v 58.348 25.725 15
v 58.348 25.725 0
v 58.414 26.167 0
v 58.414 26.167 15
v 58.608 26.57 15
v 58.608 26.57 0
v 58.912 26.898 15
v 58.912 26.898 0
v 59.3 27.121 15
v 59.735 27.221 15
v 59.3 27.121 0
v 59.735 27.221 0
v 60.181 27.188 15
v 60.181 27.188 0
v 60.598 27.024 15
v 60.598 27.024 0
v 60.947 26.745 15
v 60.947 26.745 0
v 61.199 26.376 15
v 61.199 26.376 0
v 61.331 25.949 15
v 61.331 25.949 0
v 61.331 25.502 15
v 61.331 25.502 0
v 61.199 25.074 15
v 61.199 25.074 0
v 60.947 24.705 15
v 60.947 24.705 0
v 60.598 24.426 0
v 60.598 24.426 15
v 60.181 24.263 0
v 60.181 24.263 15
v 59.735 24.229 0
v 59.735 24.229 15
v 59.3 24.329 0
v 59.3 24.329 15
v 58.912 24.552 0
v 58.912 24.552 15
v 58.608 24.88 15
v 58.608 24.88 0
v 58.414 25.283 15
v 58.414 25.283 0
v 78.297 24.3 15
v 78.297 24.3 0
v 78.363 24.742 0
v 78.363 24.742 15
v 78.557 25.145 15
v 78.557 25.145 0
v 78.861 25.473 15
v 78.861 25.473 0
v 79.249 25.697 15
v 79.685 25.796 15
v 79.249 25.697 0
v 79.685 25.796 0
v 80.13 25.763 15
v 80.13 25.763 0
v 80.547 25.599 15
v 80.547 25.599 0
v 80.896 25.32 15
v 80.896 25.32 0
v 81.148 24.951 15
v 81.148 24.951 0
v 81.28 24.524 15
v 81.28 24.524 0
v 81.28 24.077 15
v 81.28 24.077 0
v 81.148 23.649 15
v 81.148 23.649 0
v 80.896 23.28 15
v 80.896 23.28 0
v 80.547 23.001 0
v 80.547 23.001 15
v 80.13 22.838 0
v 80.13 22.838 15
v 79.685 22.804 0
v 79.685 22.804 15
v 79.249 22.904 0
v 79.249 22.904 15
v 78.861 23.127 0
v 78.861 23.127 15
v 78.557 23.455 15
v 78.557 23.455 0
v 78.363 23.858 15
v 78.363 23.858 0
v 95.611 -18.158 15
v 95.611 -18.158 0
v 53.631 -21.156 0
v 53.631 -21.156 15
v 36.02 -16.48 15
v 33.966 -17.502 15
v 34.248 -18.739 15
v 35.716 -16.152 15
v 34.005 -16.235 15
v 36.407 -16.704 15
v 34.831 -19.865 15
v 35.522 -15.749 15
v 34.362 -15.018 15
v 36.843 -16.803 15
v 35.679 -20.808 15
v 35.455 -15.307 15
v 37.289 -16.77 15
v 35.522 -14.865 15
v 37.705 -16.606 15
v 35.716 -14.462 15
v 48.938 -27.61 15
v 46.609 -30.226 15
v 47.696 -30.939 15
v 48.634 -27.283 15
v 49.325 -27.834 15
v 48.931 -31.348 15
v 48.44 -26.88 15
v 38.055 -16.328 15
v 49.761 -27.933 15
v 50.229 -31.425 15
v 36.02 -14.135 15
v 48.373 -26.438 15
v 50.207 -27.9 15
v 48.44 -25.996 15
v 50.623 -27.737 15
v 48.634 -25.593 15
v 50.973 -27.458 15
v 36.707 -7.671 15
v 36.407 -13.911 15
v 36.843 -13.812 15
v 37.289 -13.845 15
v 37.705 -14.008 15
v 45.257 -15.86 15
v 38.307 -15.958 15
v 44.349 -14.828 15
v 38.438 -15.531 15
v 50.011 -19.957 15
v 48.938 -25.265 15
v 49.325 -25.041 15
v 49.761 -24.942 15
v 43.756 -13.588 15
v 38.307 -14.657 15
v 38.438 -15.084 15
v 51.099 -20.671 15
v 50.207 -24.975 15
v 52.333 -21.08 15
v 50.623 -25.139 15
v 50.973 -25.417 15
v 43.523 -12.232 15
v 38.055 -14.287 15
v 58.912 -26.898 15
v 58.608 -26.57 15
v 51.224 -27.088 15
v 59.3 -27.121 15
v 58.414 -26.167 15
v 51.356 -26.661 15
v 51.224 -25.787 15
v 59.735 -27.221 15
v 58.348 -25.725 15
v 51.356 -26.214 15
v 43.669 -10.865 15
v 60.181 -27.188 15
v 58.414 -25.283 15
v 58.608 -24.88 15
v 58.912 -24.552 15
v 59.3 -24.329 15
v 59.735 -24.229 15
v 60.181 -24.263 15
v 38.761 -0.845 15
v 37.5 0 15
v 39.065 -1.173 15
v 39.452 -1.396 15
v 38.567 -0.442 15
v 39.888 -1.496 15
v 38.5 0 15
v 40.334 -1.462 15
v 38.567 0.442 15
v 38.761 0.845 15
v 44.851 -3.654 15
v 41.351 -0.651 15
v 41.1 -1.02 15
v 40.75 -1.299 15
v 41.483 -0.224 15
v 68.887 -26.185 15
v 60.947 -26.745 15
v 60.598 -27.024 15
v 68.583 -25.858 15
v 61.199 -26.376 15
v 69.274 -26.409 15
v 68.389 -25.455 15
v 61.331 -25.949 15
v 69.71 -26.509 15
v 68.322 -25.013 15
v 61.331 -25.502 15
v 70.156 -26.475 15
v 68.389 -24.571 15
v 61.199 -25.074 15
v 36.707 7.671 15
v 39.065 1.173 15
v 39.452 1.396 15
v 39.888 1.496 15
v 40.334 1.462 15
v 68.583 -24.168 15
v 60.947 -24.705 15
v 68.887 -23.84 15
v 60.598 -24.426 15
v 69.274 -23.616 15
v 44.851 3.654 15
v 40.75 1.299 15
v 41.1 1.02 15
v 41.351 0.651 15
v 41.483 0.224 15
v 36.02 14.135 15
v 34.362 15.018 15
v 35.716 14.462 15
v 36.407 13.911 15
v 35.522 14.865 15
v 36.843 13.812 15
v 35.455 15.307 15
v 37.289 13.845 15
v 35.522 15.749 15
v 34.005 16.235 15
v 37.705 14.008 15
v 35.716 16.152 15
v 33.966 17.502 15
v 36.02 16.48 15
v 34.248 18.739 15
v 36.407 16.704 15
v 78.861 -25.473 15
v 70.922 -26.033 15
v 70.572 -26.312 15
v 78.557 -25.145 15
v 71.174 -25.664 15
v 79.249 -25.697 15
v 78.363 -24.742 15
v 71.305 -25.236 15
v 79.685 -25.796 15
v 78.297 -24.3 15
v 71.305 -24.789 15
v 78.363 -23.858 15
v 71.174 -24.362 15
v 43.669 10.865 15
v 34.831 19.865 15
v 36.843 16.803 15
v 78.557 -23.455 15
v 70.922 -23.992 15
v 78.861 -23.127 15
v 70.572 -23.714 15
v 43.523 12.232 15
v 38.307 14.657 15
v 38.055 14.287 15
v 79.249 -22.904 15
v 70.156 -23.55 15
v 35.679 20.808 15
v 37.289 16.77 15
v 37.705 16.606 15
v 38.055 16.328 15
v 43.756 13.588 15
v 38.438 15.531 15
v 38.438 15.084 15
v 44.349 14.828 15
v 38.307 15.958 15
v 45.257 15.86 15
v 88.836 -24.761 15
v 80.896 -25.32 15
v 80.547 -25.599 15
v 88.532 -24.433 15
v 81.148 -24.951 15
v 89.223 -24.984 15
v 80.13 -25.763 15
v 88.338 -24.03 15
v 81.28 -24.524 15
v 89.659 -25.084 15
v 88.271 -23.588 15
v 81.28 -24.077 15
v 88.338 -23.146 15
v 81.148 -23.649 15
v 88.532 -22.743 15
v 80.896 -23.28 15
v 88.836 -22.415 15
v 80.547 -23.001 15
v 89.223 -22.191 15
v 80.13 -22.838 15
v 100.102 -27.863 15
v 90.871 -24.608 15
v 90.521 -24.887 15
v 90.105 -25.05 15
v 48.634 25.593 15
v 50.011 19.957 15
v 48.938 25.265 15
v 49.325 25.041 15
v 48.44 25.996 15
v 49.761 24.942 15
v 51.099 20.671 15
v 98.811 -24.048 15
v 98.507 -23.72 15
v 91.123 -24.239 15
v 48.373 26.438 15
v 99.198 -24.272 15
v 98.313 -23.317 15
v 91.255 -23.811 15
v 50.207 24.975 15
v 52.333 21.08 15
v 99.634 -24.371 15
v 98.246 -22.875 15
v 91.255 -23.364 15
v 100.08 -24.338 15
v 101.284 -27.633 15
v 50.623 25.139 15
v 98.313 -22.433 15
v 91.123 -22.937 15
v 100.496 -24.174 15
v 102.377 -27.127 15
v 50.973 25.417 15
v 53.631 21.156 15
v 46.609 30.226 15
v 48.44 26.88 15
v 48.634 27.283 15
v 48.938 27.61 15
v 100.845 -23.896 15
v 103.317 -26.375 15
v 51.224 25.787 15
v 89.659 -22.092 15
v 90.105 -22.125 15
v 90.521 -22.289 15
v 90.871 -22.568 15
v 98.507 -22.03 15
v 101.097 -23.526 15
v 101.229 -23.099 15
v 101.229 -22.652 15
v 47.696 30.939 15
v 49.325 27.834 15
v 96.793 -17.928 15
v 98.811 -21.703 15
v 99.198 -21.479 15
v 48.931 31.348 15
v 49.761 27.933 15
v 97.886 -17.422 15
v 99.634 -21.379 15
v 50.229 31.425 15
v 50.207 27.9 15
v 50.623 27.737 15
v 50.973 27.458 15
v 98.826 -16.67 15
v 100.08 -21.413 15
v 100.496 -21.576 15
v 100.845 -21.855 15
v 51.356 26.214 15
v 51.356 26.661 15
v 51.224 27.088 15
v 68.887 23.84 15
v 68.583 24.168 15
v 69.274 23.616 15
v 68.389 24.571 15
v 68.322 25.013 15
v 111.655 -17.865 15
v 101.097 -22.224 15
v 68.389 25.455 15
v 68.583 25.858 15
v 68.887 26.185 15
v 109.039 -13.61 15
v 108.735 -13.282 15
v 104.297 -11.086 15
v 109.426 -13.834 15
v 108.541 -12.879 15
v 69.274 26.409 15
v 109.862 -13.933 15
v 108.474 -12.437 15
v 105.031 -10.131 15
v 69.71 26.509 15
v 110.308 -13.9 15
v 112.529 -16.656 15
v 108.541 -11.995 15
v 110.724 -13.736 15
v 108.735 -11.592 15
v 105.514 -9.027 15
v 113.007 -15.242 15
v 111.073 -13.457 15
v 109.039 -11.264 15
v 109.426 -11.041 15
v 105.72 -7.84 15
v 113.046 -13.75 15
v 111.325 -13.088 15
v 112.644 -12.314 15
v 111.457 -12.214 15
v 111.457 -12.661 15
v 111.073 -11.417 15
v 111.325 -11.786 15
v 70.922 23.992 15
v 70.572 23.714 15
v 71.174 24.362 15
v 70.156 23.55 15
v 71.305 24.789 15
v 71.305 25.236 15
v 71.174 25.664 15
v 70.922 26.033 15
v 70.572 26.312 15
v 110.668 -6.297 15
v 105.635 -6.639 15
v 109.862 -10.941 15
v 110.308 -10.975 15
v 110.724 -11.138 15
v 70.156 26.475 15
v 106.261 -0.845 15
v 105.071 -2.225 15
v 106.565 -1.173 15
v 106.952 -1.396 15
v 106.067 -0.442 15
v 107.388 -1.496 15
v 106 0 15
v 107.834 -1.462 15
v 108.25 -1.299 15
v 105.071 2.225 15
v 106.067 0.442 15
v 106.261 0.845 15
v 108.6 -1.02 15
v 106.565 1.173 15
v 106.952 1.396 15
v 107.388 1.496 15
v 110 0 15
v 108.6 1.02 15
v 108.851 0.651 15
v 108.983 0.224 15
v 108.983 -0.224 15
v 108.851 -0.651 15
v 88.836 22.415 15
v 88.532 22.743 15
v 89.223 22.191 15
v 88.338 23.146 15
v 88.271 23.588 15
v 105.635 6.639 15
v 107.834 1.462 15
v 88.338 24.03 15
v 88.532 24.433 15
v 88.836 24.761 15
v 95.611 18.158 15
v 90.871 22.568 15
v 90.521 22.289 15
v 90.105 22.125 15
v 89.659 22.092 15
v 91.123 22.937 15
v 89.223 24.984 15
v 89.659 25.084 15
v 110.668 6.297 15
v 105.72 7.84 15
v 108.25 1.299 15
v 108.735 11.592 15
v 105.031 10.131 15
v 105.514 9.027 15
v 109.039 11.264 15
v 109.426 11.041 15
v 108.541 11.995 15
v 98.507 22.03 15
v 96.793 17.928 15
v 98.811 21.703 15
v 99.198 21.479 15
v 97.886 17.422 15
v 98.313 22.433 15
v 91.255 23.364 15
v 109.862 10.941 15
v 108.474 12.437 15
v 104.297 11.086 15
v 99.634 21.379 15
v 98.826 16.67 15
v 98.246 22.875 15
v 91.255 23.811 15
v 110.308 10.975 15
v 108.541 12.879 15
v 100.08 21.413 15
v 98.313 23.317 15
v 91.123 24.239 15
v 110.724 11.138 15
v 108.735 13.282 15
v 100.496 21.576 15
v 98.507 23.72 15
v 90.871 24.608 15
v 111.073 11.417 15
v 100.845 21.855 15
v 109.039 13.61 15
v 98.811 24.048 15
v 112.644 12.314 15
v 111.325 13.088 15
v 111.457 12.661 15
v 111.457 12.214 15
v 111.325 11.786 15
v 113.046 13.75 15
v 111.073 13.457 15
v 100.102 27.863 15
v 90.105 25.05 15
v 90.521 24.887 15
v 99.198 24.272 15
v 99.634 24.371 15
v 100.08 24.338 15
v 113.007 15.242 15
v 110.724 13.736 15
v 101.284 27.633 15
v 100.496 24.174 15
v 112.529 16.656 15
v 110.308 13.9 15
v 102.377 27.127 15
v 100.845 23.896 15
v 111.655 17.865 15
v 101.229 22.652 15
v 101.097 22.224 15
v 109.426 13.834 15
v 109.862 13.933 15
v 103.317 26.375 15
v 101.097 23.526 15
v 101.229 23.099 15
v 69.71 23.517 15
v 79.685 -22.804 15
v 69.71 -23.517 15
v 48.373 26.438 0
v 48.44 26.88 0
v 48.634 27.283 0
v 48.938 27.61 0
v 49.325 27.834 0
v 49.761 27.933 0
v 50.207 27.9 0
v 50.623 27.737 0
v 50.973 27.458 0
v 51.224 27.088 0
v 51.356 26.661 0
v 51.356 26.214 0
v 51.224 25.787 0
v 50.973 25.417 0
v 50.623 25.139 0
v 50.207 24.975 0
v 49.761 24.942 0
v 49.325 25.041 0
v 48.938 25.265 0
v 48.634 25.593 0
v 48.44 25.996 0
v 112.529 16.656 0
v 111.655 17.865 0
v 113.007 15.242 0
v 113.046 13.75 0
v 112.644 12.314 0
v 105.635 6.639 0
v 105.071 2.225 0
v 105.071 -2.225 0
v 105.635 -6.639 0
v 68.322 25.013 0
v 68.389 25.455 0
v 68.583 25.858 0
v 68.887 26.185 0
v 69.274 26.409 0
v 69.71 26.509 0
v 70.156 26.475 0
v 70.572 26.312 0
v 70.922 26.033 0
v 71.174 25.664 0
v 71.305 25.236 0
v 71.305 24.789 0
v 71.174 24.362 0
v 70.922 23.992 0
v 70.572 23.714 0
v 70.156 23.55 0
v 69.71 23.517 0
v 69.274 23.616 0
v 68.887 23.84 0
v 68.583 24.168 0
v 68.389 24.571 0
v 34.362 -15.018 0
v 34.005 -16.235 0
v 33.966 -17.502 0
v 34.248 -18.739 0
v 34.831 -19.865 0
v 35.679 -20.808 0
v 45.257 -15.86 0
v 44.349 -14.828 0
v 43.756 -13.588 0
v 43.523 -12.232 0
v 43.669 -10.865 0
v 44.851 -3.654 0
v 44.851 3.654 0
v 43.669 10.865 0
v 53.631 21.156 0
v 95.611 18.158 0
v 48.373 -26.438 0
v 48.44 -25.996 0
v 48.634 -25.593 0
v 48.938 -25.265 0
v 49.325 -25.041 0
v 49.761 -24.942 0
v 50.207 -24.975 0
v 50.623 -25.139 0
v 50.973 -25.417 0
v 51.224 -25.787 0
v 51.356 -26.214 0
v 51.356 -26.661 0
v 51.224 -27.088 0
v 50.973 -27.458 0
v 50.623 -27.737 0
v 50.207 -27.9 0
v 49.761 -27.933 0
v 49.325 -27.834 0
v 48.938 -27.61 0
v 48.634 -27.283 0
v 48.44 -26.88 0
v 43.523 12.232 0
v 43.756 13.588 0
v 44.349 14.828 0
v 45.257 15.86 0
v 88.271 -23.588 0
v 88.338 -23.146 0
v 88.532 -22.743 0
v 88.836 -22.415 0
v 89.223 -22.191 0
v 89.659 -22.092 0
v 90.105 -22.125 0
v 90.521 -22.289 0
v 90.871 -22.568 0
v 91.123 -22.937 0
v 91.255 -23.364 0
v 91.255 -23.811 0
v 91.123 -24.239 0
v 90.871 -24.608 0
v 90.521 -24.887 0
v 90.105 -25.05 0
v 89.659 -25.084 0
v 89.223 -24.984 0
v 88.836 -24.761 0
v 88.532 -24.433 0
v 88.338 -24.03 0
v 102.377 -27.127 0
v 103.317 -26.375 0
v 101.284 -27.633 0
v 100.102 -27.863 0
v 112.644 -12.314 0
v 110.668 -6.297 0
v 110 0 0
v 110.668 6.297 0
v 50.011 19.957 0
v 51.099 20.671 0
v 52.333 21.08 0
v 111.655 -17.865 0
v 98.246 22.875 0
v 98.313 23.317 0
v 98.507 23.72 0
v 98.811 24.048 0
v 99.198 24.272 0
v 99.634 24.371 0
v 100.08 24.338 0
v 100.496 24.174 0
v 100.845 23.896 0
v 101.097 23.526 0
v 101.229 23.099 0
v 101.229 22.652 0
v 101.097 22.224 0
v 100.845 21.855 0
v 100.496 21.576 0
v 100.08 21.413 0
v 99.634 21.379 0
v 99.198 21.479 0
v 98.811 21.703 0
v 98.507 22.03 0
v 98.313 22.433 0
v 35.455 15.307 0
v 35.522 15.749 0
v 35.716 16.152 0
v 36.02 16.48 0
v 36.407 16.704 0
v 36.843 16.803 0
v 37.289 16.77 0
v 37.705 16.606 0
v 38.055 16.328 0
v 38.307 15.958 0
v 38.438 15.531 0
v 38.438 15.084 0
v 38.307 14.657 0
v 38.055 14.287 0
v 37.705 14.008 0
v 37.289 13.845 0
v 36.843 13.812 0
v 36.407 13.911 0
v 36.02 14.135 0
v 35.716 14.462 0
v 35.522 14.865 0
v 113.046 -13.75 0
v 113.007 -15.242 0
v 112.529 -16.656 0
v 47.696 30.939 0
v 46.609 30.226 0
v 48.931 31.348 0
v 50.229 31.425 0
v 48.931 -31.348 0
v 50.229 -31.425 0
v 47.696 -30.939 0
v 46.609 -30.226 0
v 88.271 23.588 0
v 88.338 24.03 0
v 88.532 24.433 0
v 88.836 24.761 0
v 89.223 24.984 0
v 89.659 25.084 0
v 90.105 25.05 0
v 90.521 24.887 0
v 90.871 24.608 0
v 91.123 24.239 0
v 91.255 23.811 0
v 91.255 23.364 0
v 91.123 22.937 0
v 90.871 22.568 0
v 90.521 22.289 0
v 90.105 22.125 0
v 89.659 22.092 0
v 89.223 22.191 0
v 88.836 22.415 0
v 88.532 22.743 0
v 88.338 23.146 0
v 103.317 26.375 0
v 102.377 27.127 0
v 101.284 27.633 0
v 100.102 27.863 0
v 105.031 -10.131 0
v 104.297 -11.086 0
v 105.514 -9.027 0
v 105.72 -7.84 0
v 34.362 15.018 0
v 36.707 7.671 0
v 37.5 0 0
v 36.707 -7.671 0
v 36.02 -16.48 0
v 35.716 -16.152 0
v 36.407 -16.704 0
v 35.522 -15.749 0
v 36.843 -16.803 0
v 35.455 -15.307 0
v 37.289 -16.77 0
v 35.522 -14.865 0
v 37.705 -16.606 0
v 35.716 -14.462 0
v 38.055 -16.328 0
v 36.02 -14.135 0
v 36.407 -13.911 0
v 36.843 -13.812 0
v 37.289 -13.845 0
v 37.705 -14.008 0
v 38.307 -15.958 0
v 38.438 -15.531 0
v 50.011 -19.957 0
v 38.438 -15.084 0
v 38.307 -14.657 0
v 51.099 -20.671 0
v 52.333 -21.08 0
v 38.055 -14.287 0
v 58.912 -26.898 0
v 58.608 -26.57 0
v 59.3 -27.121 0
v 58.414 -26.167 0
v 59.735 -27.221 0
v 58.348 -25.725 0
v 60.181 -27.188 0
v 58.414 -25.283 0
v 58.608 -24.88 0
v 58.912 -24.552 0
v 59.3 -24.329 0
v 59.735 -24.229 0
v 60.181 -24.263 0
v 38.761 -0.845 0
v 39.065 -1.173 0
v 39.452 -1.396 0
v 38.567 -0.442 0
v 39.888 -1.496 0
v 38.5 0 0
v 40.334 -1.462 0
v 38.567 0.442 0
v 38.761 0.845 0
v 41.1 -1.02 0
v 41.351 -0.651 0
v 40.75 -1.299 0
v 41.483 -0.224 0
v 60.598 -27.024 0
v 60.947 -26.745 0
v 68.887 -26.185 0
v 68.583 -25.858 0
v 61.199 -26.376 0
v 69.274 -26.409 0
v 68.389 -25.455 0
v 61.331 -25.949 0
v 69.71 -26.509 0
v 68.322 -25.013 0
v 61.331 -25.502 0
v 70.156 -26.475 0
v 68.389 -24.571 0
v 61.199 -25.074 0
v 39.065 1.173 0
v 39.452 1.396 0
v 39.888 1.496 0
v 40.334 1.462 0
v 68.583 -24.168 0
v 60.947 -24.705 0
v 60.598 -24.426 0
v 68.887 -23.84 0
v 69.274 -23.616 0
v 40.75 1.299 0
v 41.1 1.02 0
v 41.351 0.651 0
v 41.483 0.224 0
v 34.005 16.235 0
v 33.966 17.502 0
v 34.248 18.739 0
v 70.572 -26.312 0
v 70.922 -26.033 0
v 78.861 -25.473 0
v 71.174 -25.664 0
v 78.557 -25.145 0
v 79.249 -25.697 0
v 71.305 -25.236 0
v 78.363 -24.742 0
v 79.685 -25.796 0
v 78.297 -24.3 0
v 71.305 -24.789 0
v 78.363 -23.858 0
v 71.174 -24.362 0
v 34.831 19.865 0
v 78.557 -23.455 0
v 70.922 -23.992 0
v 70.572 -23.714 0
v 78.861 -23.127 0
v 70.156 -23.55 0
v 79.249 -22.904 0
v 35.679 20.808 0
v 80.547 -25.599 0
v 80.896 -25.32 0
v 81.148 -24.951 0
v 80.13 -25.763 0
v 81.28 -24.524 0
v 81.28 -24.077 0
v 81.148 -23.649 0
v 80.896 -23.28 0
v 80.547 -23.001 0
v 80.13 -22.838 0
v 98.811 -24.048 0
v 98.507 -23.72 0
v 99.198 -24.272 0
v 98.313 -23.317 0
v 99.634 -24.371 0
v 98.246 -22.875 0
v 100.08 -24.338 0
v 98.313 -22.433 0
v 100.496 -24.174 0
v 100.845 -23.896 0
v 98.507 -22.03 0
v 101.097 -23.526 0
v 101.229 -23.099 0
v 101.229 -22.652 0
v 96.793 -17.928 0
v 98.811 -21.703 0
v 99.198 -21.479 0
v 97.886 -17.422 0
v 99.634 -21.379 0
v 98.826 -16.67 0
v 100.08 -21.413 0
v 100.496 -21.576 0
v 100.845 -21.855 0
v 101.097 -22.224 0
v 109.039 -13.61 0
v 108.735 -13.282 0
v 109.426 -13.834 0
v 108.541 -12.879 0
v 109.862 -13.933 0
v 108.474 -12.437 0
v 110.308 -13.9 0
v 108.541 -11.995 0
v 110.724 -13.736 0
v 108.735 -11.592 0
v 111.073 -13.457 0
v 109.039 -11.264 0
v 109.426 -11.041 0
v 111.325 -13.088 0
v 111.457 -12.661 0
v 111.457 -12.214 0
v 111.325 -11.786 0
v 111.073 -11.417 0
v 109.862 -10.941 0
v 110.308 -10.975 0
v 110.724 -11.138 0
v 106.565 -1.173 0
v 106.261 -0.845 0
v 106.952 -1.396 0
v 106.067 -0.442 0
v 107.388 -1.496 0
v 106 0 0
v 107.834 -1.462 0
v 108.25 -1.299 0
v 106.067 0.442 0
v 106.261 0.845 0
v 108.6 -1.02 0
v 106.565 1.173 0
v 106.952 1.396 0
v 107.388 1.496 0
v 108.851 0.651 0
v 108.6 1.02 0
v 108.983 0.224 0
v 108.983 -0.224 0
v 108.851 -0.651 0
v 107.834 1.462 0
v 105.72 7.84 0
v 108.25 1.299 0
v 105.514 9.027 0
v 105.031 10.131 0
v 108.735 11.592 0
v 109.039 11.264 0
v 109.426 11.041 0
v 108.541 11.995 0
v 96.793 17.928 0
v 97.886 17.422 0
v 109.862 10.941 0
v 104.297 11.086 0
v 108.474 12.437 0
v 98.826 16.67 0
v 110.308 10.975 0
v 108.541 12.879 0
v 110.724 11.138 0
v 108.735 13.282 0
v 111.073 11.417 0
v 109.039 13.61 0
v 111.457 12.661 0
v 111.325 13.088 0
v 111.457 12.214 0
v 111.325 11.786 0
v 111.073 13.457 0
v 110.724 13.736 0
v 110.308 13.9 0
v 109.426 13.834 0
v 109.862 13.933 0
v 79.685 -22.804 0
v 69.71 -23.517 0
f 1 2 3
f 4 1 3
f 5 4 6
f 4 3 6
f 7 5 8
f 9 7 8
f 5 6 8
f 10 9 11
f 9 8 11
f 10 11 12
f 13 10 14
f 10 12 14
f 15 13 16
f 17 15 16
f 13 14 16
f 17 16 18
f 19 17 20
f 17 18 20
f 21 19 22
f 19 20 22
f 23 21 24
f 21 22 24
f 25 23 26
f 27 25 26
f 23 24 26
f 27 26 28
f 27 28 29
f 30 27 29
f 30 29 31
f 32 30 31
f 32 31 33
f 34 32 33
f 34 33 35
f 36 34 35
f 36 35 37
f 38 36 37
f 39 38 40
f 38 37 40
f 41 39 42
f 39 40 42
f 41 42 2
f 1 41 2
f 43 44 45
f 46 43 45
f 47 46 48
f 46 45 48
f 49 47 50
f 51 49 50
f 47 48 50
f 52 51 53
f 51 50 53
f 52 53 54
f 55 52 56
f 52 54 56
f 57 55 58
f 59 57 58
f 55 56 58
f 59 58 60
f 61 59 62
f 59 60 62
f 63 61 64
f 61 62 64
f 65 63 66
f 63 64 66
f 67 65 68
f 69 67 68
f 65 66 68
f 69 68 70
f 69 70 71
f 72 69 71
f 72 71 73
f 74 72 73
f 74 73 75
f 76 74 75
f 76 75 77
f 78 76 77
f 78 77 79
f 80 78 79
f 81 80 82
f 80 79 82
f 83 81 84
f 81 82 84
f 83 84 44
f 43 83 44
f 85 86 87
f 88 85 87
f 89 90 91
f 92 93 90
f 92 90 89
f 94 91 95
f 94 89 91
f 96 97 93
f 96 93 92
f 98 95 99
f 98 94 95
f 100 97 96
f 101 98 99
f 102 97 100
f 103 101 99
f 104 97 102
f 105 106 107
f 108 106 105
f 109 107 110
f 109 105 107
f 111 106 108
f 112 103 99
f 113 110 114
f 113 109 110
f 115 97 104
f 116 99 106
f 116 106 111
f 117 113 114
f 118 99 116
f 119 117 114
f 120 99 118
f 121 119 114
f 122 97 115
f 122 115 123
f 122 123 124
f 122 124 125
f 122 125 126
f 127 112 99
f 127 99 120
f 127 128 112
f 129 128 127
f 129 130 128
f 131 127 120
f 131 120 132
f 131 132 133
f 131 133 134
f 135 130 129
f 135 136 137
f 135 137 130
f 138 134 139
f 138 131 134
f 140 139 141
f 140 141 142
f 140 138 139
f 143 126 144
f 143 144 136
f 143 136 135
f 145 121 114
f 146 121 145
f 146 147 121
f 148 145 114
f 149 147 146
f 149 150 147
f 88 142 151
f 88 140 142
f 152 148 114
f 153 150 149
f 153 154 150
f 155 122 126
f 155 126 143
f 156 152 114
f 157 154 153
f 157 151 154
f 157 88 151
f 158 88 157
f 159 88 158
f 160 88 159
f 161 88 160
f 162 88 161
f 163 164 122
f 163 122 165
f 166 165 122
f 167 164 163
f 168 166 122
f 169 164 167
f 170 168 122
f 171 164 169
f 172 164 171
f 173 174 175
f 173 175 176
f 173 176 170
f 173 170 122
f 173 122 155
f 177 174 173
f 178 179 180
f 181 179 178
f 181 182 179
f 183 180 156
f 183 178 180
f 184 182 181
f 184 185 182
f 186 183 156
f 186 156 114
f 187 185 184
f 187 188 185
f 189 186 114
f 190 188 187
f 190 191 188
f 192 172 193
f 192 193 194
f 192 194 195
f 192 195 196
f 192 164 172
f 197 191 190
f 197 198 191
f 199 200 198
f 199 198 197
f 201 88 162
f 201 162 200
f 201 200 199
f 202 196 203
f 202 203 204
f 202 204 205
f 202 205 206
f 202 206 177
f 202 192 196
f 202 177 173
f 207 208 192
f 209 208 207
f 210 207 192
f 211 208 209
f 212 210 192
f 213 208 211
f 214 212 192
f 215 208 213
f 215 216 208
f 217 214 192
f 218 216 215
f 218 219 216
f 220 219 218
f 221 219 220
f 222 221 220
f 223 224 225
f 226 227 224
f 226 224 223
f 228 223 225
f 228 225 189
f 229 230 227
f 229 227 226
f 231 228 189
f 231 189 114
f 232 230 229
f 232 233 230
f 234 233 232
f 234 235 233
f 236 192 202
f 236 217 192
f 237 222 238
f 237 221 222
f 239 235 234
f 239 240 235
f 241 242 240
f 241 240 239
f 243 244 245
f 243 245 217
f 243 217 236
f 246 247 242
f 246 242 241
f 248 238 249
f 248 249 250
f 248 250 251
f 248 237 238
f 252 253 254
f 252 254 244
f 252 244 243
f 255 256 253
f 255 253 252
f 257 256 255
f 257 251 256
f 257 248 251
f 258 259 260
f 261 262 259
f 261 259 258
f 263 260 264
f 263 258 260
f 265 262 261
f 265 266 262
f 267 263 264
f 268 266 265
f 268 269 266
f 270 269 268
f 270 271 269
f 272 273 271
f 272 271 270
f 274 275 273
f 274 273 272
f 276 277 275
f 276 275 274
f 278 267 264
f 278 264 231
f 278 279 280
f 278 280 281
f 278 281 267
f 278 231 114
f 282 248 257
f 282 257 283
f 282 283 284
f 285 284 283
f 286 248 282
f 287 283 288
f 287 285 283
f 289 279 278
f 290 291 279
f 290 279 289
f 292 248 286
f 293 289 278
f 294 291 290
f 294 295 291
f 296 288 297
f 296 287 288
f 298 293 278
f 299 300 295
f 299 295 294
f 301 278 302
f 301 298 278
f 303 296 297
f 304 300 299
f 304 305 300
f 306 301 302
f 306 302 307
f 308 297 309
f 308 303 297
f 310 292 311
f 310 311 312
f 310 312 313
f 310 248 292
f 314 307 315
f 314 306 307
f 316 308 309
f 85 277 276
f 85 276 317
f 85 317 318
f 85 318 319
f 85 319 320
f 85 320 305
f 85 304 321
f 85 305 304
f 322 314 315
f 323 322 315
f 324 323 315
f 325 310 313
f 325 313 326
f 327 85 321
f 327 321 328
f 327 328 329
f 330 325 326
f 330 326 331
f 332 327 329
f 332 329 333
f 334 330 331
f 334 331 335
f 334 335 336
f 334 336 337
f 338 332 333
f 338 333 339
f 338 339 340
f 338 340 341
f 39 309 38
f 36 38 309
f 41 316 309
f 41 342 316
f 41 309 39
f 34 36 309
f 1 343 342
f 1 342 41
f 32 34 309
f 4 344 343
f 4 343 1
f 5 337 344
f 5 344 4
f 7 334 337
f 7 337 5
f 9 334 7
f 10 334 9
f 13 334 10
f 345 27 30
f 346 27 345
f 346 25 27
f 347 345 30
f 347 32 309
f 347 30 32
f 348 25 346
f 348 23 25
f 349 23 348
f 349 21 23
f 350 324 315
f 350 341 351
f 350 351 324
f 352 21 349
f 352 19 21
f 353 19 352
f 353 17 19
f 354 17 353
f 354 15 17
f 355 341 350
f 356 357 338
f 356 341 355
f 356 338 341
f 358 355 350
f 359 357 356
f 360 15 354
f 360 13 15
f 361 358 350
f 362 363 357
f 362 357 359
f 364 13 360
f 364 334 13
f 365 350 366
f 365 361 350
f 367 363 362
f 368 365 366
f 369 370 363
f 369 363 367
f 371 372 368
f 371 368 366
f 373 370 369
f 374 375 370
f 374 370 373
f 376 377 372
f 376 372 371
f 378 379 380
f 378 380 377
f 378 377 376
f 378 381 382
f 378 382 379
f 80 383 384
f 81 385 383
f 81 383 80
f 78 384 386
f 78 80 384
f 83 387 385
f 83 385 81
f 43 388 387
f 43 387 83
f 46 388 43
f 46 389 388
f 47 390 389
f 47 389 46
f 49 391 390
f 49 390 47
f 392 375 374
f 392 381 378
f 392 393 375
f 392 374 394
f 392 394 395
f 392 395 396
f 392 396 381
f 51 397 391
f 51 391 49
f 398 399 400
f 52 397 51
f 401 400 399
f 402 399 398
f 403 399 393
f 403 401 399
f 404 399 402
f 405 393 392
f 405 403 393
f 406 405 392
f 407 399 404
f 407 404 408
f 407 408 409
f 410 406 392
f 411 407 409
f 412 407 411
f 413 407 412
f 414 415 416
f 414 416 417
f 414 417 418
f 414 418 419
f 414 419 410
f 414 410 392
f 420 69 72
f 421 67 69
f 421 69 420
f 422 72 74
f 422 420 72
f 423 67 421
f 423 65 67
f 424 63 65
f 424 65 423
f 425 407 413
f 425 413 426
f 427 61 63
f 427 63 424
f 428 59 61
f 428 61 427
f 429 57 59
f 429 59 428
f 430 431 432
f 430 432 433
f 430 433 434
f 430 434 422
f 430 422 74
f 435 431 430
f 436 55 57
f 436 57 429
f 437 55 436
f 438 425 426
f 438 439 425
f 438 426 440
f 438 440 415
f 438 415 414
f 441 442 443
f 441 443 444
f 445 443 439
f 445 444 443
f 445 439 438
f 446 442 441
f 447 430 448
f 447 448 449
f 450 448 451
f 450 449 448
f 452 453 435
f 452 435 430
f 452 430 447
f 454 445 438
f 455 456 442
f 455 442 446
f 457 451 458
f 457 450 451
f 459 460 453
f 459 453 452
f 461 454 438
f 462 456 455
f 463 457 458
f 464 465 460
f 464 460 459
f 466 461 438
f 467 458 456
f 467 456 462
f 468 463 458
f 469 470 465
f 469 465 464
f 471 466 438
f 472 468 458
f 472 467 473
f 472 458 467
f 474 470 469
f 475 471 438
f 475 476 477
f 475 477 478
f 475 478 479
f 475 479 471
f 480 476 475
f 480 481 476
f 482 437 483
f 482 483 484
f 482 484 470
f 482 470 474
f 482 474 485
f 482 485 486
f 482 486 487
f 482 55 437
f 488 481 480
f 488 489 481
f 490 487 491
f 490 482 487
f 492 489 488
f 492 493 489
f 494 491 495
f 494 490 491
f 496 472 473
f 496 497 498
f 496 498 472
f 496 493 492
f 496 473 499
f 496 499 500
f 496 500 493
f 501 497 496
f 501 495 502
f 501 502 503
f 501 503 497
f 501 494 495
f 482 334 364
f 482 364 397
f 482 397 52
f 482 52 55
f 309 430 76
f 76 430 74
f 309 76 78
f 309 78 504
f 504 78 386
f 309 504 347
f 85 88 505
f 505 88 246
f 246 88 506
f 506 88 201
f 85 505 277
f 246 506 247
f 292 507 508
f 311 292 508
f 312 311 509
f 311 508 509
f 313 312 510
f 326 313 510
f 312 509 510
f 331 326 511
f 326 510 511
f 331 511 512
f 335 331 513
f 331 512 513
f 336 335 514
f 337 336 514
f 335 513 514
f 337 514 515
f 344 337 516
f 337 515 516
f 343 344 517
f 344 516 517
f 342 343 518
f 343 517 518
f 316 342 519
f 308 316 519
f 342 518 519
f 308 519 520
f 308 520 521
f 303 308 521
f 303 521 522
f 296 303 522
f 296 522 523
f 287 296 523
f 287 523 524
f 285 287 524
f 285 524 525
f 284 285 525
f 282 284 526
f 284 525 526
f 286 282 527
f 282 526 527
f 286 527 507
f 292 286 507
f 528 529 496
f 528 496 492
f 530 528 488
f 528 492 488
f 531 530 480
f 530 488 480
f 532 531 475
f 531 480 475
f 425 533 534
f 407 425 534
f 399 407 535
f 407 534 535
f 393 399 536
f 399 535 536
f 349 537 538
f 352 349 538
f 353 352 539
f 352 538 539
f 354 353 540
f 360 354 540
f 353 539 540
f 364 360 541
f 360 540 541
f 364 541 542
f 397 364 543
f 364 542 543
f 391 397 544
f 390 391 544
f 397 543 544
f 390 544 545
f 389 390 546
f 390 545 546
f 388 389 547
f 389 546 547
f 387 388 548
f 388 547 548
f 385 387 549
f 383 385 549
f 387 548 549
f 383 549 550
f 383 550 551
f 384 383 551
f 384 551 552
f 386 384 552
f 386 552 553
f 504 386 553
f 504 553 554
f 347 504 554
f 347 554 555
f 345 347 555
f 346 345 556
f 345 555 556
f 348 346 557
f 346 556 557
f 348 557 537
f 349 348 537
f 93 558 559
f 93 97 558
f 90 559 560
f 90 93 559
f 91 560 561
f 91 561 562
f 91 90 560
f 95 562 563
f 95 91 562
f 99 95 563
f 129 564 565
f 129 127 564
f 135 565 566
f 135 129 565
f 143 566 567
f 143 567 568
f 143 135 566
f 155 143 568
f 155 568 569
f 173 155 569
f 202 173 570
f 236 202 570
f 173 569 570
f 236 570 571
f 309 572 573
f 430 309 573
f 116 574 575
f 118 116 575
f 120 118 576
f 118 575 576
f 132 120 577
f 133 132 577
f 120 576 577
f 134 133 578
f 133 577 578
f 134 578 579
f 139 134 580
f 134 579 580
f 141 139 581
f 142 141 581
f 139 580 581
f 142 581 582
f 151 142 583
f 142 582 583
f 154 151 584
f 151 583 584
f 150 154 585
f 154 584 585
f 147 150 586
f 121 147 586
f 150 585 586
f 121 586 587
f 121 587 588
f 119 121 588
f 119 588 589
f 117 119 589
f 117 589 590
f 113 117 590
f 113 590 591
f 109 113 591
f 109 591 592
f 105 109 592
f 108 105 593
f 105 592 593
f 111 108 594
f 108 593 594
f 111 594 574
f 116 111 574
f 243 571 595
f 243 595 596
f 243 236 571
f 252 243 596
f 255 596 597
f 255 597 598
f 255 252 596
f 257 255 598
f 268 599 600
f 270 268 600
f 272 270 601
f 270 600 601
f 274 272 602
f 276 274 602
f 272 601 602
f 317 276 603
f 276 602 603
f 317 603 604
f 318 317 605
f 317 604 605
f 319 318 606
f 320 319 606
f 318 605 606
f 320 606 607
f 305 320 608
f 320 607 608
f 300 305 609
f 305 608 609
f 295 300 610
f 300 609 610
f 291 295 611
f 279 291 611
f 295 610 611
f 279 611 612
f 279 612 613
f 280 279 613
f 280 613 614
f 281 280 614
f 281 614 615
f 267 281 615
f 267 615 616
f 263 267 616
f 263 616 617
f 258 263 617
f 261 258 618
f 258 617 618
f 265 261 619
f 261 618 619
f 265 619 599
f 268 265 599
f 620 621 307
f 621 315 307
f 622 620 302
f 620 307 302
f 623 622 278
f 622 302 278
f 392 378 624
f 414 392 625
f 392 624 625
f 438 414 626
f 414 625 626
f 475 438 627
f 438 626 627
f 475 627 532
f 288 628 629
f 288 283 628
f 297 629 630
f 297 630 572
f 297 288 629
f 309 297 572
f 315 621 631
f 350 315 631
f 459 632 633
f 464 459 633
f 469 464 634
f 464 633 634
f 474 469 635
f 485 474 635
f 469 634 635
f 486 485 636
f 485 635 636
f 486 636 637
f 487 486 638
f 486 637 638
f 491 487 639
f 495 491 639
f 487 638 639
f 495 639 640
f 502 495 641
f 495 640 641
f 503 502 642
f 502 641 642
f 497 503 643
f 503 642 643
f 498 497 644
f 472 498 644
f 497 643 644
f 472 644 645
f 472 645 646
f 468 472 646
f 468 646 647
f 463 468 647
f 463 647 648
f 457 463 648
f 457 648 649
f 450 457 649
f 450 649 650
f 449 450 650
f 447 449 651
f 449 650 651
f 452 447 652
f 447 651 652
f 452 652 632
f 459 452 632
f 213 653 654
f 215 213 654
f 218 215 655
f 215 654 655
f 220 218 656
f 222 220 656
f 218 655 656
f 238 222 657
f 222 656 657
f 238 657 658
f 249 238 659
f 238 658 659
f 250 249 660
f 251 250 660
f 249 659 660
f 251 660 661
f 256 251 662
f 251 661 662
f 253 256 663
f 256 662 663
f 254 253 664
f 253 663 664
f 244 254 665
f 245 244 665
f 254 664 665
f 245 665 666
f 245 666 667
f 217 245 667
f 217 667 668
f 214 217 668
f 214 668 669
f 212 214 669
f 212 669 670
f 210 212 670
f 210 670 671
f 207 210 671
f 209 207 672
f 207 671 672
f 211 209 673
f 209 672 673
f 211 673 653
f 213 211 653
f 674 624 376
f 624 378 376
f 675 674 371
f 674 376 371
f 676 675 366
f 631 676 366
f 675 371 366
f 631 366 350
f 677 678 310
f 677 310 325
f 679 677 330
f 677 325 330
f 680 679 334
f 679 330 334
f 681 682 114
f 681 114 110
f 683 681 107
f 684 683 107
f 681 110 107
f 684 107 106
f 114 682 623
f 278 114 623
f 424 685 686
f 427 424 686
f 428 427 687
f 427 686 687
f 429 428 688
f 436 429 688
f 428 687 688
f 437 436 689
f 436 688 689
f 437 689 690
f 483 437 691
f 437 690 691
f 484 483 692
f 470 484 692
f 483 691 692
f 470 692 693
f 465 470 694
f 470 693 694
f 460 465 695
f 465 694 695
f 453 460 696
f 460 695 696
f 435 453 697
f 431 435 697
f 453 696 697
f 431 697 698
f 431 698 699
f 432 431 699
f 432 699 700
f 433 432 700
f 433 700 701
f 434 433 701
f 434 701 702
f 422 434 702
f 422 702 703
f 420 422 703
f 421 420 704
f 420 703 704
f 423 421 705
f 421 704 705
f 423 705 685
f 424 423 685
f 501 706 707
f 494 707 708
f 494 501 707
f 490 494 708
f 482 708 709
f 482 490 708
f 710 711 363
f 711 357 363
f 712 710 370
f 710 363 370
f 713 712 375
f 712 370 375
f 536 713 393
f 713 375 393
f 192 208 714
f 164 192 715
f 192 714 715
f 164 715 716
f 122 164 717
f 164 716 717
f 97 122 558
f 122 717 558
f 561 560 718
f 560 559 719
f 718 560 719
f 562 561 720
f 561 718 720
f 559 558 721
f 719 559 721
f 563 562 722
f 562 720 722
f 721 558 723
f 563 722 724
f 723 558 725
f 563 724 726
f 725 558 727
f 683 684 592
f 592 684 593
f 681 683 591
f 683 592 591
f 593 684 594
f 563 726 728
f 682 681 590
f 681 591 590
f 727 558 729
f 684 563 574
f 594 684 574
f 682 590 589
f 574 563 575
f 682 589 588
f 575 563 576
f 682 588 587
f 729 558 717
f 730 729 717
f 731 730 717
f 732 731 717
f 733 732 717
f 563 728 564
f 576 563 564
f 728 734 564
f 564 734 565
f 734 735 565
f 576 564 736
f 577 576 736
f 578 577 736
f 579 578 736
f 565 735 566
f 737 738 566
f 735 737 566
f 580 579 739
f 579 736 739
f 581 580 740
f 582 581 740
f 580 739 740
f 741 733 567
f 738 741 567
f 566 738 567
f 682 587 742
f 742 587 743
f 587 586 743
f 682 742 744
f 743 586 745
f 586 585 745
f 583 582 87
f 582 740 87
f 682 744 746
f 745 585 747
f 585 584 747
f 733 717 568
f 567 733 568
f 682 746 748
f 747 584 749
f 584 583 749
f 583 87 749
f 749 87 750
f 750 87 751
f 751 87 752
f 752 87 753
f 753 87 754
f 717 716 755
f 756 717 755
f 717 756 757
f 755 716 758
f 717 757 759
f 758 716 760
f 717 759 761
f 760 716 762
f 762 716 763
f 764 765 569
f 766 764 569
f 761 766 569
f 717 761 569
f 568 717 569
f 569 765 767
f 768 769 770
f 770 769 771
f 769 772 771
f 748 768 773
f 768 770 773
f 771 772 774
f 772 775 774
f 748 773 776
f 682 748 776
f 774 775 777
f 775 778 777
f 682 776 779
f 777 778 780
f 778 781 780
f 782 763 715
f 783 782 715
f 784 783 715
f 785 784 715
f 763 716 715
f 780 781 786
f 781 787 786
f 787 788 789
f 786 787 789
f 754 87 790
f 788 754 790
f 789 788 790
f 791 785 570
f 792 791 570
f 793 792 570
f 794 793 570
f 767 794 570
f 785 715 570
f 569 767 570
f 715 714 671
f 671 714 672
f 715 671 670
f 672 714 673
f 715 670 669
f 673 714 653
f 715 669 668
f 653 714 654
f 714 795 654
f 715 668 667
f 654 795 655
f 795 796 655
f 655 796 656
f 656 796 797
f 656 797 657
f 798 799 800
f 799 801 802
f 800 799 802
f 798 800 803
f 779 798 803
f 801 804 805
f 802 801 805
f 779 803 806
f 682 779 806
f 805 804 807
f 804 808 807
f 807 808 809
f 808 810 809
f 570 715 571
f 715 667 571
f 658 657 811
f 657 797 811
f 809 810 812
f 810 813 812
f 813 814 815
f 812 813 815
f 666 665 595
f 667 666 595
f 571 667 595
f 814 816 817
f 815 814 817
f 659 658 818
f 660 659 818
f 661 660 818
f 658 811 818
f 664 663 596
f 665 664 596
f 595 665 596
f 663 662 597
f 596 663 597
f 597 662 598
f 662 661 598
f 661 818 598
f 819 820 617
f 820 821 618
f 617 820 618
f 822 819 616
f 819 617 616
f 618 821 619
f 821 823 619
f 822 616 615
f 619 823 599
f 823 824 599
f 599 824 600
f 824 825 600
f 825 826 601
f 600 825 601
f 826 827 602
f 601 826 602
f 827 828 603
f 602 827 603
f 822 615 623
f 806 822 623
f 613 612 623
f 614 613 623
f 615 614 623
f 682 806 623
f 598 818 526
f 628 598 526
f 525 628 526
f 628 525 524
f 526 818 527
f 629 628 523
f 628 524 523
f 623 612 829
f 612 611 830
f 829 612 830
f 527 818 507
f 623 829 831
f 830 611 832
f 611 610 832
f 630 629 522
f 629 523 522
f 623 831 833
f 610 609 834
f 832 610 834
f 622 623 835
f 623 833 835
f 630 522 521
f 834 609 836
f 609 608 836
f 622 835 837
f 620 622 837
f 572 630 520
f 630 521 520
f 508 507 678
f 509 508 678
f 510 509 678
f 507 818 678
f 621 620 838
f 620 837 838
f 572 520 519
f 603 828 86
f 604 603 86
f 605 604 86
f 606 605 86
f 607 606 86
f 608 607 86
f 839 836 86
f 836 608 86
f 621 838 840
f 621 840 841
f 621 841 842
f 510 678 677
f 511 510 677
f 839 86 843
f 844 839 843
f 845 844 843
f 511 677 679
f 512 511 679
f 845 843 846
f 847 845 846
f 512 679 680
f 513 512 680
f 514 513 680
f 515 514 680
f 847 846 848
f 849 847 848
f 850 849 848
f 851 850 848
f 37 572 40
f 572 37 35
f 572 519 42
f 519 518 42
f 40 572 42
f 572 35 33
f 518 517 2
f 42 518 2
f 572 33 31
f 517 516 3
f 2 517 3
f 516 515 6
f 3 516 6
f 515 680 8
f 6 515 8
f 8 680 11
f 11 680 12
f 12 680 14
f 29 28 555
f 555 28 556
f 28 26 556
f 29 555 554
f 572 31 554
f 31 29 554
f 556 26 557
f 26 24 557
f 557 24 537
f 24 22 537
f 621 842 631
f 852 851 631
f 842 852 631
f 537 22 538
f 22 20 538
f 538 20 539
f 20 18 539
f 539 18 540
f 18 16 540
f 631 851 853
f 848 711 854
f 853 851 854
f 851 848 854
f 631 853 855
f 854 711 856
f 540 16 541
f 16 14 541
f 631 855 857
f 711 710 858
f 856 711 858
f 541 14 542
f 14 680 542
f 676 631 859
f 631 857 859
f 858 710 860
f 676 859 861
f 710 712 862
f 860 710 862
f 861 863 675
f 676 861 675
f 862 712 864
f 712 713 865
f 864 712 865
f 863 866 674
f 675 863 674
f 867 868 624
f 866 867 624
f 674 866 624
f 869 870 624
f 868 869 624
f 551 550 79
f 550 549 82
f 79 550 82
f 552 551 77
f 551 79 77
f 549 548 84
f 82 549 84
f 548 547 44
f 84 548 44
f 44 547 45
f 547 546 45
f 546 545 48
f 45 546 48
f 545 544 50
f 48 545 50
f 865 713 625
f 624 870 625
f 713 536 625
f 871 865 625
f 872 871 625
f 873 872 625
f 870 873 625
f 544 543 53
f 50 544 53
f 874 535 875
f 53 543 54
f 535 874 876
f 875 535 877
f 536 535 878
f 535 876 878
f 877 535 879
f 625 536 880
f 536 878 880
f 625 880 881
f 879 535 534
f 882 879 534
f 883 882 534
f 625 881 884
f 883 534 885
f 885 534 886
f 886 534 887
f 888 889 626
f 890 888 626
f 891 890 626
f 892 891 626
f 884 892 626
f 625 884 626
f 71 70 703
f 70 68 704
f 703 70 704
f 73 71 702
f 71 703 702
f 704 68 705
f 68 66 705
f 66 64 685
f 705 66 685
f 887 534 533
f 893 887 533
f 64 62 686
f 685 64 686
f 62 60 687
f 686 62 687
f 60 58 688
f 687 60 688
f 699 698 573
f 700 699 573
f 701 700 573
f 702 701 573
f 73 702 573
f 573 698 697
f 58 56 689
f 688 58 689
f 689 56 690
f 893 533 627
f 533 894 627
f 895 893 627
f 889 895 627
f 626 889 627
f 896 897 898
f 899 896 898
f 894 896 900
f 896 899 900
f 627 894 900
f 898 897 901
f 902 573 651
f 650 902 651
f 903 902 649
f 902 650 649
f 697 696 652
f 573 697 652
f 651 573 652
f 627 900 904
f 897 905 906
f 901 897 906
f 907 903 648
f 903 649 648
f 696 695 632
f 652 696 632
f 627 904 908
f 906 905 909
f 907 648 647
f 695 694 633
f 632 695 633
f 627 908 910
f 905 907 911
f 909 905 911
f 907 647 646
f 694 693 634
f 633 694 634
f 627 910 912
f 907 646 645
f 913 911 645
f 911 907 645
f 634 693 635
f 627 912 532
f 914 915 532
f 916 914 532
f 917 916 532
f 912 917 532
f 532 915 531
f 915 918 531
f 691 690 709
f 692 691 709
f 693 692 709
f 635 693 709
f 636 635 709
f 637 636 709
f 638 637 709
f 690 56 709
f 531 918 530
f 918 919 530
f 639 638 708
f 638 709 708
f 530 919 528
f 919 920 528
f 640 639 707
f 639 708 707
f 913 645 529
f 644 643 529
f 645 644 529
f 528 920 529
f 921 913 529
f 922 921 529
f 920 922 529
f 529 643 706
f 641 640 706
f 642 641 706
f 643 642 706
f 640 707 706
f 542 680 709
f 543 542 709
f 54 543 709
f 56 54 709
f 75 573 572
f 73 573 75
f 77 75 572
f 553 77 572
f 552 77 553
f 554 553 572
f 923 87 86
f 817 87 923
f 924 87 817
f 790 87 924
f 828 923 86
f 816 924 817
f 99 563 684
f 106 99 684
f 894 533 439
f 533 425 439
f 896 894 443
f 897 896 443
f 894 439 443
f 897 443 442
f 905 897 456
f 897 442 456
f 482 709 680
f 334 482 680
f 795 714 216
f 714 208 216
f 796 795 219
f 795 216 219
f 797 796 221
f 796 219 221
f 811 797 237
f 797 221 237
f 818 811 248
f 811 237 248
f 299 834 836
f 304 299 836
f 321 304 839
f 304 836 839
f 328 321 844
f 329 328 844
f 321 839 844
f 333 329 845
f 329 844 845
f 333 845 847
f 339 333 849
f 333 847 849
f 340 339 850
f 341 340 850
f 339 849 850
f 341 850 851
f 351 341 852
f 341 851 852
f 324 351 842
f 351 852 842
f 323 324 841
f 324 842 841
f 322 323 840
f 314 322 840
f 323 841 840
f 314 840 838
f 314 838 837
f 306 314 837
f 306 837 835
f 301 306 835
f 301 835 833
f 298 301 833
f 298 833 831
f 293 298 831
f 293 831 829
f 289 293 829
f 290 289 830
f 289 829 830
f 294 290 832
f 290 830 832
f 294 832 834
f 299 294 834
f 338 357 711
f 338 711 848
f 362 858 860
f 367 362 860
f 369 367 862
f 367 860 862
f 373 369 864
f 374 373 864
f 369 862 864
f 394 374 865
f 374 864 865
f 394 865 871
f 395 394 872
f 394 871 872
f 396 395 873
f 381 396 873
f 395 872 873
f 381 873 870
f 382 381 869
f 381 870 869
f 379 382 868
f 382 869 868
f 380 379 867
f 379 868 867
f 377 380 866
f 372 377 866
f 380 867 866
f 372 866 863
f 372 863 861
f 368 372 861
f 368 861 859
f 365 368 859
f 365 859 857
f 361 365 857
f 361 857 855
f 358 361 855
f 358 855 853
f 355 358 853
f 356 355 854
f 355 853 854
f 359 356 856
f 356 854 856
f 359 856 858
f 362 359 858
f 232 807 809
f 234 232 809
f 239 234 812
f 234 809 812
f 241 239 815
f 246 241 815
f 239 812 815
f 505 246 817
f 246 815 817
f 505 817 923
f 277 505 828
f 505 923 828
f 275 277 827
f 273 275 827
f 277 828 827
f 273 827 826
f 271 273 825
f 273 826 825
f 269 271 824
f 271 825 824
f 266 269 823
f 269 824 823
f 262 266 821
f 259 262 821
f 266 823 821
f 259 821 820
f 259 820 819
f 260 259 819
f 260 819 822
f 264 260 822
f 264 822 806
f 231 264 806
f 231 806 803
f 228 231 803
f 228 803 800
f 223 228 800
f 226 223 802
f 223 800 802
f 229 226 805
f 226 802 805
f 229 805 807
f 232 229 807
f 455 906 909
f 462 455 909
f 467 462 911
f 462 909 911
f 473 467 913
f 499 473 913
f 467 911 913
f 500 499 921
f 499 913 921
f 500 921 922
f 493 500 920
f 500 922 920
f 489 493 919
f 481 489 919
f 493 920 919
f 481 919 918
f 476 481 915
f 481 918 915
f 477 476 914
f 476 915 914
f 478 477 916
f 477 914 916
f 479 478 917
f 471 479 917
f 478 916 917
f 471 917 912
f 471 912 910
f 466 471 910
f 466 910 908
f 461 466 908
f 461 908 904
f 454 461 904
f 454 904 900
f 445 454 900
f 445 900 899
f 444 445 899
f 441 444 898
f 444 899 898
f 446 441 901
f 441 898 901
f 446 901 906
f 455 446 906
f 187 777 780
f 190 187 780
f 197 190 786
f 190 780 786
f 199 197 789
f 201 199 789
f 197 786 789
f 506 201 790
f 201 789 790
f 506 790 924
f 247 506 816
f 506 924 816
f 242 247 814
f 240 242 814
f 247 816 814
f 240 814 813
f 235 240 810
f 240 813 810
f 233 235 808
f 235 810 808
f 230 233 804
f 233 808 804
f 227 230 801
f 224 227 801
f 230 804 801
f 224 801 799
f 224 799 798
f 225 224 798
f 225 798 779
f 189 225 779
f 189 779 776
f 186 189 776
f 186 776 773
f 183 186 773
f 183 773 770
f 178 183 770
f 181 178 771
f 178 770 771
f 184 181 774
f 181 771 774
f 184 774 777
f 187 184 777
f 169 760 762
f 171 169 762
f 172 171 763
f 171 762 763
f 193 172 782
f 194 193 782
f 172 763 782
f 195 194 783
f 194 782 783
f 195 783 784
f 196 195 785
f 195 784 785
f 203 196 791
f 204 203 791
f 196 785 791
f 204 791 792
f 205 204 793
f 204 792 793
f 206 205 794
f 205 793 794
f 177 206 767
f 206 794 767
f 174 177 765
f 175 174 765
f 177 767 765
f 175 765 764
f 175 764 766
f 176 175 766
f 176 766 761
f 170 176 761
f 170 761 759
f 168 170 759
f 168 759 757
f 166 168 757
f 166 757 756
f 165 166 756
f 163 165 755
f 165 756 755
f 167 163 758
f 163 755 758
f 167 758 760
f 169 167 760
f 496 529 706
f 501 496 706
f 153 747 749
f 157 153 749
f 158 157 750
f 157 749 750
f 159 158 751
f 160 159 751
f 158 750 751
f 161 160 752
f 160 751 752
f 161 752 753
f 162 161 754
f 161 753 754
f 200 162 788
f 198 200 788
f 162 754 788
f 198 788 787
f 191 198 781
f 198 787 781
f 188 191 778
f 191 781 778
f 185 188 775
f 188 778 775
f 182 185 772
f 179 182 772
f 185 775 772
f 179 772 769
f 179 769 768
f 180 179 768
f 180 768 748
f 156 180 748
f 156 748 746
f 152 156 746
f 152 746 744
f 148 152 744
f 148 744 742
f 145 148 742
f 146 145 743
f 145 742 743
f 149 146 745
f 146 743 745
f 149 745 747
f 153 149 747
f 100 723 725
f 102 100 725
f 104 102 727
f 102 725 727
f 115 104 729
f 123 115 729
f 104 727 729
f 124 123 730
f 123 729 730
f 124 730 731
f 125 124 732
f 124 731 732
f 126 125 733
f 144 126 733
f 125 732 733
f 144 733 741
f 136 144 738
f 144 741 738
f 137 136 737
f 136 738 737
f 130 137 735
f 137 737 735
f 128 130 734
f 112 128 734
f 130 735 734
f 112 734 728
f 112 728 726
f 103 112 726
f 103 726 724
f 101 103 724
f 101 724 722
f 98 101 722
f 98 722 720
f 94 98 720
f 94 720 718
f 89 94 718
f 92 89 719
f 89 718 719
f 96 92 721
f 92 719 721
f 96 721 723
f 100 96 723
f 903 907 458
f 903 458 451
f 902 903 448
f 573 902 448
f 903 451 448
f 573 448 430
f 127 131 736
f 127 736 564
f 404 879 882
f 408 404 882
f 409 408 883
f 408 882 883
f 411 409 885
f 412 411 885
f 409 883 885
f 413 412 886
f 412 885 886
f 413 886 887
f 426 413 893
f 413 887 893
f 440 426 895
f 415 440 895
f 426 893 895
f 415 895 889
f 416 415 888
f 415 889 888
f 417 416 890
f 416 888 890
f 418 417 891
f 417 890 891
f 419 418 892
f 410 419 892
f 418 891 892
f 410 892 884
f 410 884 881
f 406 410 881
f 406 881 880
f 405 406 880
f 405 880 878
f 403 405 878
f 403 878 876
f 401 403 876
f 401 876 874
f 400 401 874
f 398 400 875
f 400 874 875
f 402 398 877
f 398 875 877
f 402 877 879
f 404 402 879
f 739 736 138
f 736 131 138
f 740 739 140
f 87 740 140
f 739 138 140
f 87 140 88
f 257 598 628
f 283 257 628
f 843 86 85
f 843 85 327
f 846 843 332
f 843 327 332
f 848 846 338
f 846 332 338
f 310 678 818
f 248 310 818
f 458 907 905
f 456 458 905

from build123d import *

# Parameters (mm, degrees)
EXTRUDE_1_DEPTH     = 15
FILLET_1_R          = 5
FILLET_2_R          = 5
FILLET_3_R          = 5
FILLET_4_R          = 5
FILLET_5_R          = 5
FILLET_6_R          = 5
FILLET_7_R          = 5
FILLET_8_R          = 5
FILLET_9_R          = 5
FILLET_10_R         = 5
FILLET_11_R         = 5
FILLET_12_R         = 5
FILLET_13_R         = 5
FILLET_14_R         = 5
FILLET_15_R         = 5
FILLET_16_R         = 5
SKETCH_5_R          = 1.5
CUT_EXTRUDE_1_DEPTH = 15


with BuildPart() as part:
    # 草图3 → 凸台-拉伸1 (new body)
    with BuildSketch(Plane.XY):
        with BuildLine():
            Line((101.99145665, -27.727634828), (114.18506552, -15.283623844))
            ThreePointArc((114.18506552, -15.283623844), (110, 0), (114.18506552, 15.283623844))
            Line((114.18506552, 15.283623844), (101.99145665, 27.727634828))
            Line((101.99145665, 27.727634828), (48.171786379, 31.57189699))
            Line((48.171786379, 31.57189699), (32.743622368, 18.278544642))
            ThreePointArc((32.743622368, 18.278544642), (37.5, 0), (32.743622368, -18.278544642))
            Line((32.743622368, -18.278544642), (48.171786379, -31.57189699))
            Line((48.171786379, -31.57189699), (101.99145665, -27.727634828))
        make_face()
        with BuildLine():
            ThreePointArc((42.839131819, -13.777110909), (45, 0), (42.839131819, 13.777110909))
            Line((42.839131819, 13.777110909), (51.574083604, 21.303398011))
            Line((51.574083604, 21.303398011), (97.500283316, 18.022955175))
            Line((97.500283316, 18.022955175), (106.212331228, 9.132000819))
            ThreePointArc((106.212331228, 9.132000819), (105, 0), (106.212331228, -9.132000819))
            Line((106.212331228, -9.132000819), (97.500283316, -18.022955175))
            Line((97.500283316, -18.022955175), (51.574083604, -21.303398011))
            Line((51.574083604, -21.303398011), (42.839131819, -13.777110909))
        make_face(mode=Mode.SUBTRACT)
    extrude(amount=EXTRUDE_1_DEPTH)

    # 圆角1
    fillet_1_edges = [part.edges().sort_by_distance(p)[0] for p in [
        (101.99145665, 27.727634828, 7.5),
    ]]
    fillet(fillet_1_edges, radius=FILLET_1_R)

    # 圆角2
    fillet_2_edges = [part.edges().sort_by_distance(p)[0] for p in [
        (114.18506552, 15.283623844, 7.5),
    ]]
    fillet(fillet_2_edges, radius=FILLET_2_R)

    # 圆角3
    fillet_3_edges = [part.edges().sort_by_distance(p)[0] for p in [
        (114.18506552, -15.283623844, 7.5),
    ]]
    fillet(fillet_3_edges, radius=FILLET_3_R)

    # 圆角4
    fillet_4_edges = [part.edges().sort_by_distance(p)[0] for p in [
        (101.99145665, -27.727634828, 7.5),
    ]]
    fillet(fillet_4_edges, radius=FILLET_4_R)

    # 圆角5
    fillet_5_edges = [part.edges().sort_by_distance(p)[0] for p in [
        (48.171786379, -31.57189699, 7.5),
    ]]
    fillet(fillet_5_edges, radius=FILLET_5_R)

    # 圆角6
    fillet_6_edges = [part.edges().sort_by_distance(p)[0] for p in [
        (48.171786379, 31.57189699, 7.5),
    ]]
    fillet(fillet_6_edges, radius=FILLET_6_R)

    # 圆角7
    fillet_7_edges = [part.edges().sort_by_distance(p)[0] for p in [
        (32.743622368, -18.278544642, 7.5),
    ]]
    fillet(fillet_7_edges, radius=FILLET_7_R)

    # 圆角8
    fillet_8_edges = [part.edges().sort_by_distance(p)[0] for p in [
        (32.743622368, 18.278544642, 7.5),
    ]]
    fillet(fillet_8_edges, radius=FILLET_8_R)

    # 圆角9
    fillet_9_edges = [part.edges().sort_by_distance(p)[0] for p in [
        (97.500283316, -18.022955175, 7.5),
    ]]
    fillet(fillet_9_edges, radius=FILLET_9_R)

    # 圆角10
    fillet_10_edges = [part.edges().sort_by_distance(p)[0] for p in [
        (106.212331228, -9.132000819, 7.5),
    ]]
    fillet(fillet_10_edges, radius=FILLET_10_R)

    # 圆角11
    fillet_11_edges = [part.edges().sort_by_distance(p)[0] for p in [
        (106.212331228, 9.132000819, 7.5),
    ]]
    fillet(fillet_11_edges, radius=FILLET_11_R)

    # 圆角12
    fillet_12_edges = [part.edges().sort_by_distance(p)[0] for p in [
        (97.500283316, 18.022955175, 7.5),
    ]]
    fillet(fillet_12_edges, radius=FILLET_12_R)

    # 圆角13
    fillet_13_edges = [part.edges().sort_by_distance(p)[0] for p in [
        (51.574083604, -21.303398011, 7.5),
    ]]
    fillet(fillet_13_edges, radius=FILLET_13_R)

    # 圆角14
    fillet_14_edges = [part.edges().sort_by_distance(p)[0] for p in [
        (42.839131819, -13.777110909, 7.5),
    ]]
    fillet(fillet_14_edges, radius=FILLET_14_R)

    # 圆角15
    fillet_15_edges = [part.edges().sort_by_distance(p)[0] for p in [
        (42.839131819, 13.777110909, 7.5),
    ]]
    fillet(fillet_15_edges, radius=FILLET_15_R)

    # 圆角16
    fillet_16_edges = [part.edges().sort_by_distance(p)[0] for p in [
        (51.574083604, 21.303398011, 7.5),
    ]]
    fillet(fillet_16_edges, radius=FILLET_16_R)

    # 草图5 → 切除-拉伸1 (cut)
    with BuildSketch(Plane(origin=(0, 0, 0), x_dir=(-1, 0, 0), z_dir=(0, 0, -1))):
        with Locations((-36.9551813, 15.307337295)):
            Circle(SKETCH_5_R)
        with Locations((-40, 0)):
            Circle(SKETCH_5_R)
        with Locations((-36.9551813, -15.307337295)):
            Circle(SKETCH_5_R)
        with Locations((-49.872934992, -26.437647501)):
            Circle(SKETCH_5_R)
        with Locations((-49.872934992, 26.437647501)):
            Circle(SKETCH_5_R)
        with Locations((-99.745869983, 22.875295001)):
            Circle(SKETCH_5_R)
        with Locations((-99.745869983, -22.875295001)):
            Circle(SKETCH_5_R)
        with Locations((-109.973915193, 12.437211552)):
            Circle(SKETCH_5_R)
        with Locations((-107.5, 0)):
            Circle(SKETCH_5_R)
        with Locations((-109.973915193, -12.437211552)):
            Circle(SKETCH_5_R)
        with Locations((-59.84752199, 25.725177001)):
            Circle(SKETCH_5_R)
        with Locations((-69.822108988, 25.012706501)):
            Circle(SKETCH_5_R)
        with Locations((-79.796695986, 24.300236001)):
            Circle(SKETCH_5_R)
        with Locations((-89.771282985, 23.587765501)):
            Circle(SKETCH_5_R)
        with Locations((-89.771282985, -23.587765501)):
            Circle(SKETCH_5_R)
        with Locations((-79.796695986, -24.300236001)):
            Circle(SKETCH_5_R)
        with Locations((-69.822108988, -25.012706501)):
            Circle(SKETCH_5_R)
        with Locations((-59.84752199, -25.725177001)):
            Circle(SKETCH_5_R)
    extrude(amount=-CUT_EXTRUDE_1_DEPTH, mode=Mode.SUBTRACT)


solid = part.part
